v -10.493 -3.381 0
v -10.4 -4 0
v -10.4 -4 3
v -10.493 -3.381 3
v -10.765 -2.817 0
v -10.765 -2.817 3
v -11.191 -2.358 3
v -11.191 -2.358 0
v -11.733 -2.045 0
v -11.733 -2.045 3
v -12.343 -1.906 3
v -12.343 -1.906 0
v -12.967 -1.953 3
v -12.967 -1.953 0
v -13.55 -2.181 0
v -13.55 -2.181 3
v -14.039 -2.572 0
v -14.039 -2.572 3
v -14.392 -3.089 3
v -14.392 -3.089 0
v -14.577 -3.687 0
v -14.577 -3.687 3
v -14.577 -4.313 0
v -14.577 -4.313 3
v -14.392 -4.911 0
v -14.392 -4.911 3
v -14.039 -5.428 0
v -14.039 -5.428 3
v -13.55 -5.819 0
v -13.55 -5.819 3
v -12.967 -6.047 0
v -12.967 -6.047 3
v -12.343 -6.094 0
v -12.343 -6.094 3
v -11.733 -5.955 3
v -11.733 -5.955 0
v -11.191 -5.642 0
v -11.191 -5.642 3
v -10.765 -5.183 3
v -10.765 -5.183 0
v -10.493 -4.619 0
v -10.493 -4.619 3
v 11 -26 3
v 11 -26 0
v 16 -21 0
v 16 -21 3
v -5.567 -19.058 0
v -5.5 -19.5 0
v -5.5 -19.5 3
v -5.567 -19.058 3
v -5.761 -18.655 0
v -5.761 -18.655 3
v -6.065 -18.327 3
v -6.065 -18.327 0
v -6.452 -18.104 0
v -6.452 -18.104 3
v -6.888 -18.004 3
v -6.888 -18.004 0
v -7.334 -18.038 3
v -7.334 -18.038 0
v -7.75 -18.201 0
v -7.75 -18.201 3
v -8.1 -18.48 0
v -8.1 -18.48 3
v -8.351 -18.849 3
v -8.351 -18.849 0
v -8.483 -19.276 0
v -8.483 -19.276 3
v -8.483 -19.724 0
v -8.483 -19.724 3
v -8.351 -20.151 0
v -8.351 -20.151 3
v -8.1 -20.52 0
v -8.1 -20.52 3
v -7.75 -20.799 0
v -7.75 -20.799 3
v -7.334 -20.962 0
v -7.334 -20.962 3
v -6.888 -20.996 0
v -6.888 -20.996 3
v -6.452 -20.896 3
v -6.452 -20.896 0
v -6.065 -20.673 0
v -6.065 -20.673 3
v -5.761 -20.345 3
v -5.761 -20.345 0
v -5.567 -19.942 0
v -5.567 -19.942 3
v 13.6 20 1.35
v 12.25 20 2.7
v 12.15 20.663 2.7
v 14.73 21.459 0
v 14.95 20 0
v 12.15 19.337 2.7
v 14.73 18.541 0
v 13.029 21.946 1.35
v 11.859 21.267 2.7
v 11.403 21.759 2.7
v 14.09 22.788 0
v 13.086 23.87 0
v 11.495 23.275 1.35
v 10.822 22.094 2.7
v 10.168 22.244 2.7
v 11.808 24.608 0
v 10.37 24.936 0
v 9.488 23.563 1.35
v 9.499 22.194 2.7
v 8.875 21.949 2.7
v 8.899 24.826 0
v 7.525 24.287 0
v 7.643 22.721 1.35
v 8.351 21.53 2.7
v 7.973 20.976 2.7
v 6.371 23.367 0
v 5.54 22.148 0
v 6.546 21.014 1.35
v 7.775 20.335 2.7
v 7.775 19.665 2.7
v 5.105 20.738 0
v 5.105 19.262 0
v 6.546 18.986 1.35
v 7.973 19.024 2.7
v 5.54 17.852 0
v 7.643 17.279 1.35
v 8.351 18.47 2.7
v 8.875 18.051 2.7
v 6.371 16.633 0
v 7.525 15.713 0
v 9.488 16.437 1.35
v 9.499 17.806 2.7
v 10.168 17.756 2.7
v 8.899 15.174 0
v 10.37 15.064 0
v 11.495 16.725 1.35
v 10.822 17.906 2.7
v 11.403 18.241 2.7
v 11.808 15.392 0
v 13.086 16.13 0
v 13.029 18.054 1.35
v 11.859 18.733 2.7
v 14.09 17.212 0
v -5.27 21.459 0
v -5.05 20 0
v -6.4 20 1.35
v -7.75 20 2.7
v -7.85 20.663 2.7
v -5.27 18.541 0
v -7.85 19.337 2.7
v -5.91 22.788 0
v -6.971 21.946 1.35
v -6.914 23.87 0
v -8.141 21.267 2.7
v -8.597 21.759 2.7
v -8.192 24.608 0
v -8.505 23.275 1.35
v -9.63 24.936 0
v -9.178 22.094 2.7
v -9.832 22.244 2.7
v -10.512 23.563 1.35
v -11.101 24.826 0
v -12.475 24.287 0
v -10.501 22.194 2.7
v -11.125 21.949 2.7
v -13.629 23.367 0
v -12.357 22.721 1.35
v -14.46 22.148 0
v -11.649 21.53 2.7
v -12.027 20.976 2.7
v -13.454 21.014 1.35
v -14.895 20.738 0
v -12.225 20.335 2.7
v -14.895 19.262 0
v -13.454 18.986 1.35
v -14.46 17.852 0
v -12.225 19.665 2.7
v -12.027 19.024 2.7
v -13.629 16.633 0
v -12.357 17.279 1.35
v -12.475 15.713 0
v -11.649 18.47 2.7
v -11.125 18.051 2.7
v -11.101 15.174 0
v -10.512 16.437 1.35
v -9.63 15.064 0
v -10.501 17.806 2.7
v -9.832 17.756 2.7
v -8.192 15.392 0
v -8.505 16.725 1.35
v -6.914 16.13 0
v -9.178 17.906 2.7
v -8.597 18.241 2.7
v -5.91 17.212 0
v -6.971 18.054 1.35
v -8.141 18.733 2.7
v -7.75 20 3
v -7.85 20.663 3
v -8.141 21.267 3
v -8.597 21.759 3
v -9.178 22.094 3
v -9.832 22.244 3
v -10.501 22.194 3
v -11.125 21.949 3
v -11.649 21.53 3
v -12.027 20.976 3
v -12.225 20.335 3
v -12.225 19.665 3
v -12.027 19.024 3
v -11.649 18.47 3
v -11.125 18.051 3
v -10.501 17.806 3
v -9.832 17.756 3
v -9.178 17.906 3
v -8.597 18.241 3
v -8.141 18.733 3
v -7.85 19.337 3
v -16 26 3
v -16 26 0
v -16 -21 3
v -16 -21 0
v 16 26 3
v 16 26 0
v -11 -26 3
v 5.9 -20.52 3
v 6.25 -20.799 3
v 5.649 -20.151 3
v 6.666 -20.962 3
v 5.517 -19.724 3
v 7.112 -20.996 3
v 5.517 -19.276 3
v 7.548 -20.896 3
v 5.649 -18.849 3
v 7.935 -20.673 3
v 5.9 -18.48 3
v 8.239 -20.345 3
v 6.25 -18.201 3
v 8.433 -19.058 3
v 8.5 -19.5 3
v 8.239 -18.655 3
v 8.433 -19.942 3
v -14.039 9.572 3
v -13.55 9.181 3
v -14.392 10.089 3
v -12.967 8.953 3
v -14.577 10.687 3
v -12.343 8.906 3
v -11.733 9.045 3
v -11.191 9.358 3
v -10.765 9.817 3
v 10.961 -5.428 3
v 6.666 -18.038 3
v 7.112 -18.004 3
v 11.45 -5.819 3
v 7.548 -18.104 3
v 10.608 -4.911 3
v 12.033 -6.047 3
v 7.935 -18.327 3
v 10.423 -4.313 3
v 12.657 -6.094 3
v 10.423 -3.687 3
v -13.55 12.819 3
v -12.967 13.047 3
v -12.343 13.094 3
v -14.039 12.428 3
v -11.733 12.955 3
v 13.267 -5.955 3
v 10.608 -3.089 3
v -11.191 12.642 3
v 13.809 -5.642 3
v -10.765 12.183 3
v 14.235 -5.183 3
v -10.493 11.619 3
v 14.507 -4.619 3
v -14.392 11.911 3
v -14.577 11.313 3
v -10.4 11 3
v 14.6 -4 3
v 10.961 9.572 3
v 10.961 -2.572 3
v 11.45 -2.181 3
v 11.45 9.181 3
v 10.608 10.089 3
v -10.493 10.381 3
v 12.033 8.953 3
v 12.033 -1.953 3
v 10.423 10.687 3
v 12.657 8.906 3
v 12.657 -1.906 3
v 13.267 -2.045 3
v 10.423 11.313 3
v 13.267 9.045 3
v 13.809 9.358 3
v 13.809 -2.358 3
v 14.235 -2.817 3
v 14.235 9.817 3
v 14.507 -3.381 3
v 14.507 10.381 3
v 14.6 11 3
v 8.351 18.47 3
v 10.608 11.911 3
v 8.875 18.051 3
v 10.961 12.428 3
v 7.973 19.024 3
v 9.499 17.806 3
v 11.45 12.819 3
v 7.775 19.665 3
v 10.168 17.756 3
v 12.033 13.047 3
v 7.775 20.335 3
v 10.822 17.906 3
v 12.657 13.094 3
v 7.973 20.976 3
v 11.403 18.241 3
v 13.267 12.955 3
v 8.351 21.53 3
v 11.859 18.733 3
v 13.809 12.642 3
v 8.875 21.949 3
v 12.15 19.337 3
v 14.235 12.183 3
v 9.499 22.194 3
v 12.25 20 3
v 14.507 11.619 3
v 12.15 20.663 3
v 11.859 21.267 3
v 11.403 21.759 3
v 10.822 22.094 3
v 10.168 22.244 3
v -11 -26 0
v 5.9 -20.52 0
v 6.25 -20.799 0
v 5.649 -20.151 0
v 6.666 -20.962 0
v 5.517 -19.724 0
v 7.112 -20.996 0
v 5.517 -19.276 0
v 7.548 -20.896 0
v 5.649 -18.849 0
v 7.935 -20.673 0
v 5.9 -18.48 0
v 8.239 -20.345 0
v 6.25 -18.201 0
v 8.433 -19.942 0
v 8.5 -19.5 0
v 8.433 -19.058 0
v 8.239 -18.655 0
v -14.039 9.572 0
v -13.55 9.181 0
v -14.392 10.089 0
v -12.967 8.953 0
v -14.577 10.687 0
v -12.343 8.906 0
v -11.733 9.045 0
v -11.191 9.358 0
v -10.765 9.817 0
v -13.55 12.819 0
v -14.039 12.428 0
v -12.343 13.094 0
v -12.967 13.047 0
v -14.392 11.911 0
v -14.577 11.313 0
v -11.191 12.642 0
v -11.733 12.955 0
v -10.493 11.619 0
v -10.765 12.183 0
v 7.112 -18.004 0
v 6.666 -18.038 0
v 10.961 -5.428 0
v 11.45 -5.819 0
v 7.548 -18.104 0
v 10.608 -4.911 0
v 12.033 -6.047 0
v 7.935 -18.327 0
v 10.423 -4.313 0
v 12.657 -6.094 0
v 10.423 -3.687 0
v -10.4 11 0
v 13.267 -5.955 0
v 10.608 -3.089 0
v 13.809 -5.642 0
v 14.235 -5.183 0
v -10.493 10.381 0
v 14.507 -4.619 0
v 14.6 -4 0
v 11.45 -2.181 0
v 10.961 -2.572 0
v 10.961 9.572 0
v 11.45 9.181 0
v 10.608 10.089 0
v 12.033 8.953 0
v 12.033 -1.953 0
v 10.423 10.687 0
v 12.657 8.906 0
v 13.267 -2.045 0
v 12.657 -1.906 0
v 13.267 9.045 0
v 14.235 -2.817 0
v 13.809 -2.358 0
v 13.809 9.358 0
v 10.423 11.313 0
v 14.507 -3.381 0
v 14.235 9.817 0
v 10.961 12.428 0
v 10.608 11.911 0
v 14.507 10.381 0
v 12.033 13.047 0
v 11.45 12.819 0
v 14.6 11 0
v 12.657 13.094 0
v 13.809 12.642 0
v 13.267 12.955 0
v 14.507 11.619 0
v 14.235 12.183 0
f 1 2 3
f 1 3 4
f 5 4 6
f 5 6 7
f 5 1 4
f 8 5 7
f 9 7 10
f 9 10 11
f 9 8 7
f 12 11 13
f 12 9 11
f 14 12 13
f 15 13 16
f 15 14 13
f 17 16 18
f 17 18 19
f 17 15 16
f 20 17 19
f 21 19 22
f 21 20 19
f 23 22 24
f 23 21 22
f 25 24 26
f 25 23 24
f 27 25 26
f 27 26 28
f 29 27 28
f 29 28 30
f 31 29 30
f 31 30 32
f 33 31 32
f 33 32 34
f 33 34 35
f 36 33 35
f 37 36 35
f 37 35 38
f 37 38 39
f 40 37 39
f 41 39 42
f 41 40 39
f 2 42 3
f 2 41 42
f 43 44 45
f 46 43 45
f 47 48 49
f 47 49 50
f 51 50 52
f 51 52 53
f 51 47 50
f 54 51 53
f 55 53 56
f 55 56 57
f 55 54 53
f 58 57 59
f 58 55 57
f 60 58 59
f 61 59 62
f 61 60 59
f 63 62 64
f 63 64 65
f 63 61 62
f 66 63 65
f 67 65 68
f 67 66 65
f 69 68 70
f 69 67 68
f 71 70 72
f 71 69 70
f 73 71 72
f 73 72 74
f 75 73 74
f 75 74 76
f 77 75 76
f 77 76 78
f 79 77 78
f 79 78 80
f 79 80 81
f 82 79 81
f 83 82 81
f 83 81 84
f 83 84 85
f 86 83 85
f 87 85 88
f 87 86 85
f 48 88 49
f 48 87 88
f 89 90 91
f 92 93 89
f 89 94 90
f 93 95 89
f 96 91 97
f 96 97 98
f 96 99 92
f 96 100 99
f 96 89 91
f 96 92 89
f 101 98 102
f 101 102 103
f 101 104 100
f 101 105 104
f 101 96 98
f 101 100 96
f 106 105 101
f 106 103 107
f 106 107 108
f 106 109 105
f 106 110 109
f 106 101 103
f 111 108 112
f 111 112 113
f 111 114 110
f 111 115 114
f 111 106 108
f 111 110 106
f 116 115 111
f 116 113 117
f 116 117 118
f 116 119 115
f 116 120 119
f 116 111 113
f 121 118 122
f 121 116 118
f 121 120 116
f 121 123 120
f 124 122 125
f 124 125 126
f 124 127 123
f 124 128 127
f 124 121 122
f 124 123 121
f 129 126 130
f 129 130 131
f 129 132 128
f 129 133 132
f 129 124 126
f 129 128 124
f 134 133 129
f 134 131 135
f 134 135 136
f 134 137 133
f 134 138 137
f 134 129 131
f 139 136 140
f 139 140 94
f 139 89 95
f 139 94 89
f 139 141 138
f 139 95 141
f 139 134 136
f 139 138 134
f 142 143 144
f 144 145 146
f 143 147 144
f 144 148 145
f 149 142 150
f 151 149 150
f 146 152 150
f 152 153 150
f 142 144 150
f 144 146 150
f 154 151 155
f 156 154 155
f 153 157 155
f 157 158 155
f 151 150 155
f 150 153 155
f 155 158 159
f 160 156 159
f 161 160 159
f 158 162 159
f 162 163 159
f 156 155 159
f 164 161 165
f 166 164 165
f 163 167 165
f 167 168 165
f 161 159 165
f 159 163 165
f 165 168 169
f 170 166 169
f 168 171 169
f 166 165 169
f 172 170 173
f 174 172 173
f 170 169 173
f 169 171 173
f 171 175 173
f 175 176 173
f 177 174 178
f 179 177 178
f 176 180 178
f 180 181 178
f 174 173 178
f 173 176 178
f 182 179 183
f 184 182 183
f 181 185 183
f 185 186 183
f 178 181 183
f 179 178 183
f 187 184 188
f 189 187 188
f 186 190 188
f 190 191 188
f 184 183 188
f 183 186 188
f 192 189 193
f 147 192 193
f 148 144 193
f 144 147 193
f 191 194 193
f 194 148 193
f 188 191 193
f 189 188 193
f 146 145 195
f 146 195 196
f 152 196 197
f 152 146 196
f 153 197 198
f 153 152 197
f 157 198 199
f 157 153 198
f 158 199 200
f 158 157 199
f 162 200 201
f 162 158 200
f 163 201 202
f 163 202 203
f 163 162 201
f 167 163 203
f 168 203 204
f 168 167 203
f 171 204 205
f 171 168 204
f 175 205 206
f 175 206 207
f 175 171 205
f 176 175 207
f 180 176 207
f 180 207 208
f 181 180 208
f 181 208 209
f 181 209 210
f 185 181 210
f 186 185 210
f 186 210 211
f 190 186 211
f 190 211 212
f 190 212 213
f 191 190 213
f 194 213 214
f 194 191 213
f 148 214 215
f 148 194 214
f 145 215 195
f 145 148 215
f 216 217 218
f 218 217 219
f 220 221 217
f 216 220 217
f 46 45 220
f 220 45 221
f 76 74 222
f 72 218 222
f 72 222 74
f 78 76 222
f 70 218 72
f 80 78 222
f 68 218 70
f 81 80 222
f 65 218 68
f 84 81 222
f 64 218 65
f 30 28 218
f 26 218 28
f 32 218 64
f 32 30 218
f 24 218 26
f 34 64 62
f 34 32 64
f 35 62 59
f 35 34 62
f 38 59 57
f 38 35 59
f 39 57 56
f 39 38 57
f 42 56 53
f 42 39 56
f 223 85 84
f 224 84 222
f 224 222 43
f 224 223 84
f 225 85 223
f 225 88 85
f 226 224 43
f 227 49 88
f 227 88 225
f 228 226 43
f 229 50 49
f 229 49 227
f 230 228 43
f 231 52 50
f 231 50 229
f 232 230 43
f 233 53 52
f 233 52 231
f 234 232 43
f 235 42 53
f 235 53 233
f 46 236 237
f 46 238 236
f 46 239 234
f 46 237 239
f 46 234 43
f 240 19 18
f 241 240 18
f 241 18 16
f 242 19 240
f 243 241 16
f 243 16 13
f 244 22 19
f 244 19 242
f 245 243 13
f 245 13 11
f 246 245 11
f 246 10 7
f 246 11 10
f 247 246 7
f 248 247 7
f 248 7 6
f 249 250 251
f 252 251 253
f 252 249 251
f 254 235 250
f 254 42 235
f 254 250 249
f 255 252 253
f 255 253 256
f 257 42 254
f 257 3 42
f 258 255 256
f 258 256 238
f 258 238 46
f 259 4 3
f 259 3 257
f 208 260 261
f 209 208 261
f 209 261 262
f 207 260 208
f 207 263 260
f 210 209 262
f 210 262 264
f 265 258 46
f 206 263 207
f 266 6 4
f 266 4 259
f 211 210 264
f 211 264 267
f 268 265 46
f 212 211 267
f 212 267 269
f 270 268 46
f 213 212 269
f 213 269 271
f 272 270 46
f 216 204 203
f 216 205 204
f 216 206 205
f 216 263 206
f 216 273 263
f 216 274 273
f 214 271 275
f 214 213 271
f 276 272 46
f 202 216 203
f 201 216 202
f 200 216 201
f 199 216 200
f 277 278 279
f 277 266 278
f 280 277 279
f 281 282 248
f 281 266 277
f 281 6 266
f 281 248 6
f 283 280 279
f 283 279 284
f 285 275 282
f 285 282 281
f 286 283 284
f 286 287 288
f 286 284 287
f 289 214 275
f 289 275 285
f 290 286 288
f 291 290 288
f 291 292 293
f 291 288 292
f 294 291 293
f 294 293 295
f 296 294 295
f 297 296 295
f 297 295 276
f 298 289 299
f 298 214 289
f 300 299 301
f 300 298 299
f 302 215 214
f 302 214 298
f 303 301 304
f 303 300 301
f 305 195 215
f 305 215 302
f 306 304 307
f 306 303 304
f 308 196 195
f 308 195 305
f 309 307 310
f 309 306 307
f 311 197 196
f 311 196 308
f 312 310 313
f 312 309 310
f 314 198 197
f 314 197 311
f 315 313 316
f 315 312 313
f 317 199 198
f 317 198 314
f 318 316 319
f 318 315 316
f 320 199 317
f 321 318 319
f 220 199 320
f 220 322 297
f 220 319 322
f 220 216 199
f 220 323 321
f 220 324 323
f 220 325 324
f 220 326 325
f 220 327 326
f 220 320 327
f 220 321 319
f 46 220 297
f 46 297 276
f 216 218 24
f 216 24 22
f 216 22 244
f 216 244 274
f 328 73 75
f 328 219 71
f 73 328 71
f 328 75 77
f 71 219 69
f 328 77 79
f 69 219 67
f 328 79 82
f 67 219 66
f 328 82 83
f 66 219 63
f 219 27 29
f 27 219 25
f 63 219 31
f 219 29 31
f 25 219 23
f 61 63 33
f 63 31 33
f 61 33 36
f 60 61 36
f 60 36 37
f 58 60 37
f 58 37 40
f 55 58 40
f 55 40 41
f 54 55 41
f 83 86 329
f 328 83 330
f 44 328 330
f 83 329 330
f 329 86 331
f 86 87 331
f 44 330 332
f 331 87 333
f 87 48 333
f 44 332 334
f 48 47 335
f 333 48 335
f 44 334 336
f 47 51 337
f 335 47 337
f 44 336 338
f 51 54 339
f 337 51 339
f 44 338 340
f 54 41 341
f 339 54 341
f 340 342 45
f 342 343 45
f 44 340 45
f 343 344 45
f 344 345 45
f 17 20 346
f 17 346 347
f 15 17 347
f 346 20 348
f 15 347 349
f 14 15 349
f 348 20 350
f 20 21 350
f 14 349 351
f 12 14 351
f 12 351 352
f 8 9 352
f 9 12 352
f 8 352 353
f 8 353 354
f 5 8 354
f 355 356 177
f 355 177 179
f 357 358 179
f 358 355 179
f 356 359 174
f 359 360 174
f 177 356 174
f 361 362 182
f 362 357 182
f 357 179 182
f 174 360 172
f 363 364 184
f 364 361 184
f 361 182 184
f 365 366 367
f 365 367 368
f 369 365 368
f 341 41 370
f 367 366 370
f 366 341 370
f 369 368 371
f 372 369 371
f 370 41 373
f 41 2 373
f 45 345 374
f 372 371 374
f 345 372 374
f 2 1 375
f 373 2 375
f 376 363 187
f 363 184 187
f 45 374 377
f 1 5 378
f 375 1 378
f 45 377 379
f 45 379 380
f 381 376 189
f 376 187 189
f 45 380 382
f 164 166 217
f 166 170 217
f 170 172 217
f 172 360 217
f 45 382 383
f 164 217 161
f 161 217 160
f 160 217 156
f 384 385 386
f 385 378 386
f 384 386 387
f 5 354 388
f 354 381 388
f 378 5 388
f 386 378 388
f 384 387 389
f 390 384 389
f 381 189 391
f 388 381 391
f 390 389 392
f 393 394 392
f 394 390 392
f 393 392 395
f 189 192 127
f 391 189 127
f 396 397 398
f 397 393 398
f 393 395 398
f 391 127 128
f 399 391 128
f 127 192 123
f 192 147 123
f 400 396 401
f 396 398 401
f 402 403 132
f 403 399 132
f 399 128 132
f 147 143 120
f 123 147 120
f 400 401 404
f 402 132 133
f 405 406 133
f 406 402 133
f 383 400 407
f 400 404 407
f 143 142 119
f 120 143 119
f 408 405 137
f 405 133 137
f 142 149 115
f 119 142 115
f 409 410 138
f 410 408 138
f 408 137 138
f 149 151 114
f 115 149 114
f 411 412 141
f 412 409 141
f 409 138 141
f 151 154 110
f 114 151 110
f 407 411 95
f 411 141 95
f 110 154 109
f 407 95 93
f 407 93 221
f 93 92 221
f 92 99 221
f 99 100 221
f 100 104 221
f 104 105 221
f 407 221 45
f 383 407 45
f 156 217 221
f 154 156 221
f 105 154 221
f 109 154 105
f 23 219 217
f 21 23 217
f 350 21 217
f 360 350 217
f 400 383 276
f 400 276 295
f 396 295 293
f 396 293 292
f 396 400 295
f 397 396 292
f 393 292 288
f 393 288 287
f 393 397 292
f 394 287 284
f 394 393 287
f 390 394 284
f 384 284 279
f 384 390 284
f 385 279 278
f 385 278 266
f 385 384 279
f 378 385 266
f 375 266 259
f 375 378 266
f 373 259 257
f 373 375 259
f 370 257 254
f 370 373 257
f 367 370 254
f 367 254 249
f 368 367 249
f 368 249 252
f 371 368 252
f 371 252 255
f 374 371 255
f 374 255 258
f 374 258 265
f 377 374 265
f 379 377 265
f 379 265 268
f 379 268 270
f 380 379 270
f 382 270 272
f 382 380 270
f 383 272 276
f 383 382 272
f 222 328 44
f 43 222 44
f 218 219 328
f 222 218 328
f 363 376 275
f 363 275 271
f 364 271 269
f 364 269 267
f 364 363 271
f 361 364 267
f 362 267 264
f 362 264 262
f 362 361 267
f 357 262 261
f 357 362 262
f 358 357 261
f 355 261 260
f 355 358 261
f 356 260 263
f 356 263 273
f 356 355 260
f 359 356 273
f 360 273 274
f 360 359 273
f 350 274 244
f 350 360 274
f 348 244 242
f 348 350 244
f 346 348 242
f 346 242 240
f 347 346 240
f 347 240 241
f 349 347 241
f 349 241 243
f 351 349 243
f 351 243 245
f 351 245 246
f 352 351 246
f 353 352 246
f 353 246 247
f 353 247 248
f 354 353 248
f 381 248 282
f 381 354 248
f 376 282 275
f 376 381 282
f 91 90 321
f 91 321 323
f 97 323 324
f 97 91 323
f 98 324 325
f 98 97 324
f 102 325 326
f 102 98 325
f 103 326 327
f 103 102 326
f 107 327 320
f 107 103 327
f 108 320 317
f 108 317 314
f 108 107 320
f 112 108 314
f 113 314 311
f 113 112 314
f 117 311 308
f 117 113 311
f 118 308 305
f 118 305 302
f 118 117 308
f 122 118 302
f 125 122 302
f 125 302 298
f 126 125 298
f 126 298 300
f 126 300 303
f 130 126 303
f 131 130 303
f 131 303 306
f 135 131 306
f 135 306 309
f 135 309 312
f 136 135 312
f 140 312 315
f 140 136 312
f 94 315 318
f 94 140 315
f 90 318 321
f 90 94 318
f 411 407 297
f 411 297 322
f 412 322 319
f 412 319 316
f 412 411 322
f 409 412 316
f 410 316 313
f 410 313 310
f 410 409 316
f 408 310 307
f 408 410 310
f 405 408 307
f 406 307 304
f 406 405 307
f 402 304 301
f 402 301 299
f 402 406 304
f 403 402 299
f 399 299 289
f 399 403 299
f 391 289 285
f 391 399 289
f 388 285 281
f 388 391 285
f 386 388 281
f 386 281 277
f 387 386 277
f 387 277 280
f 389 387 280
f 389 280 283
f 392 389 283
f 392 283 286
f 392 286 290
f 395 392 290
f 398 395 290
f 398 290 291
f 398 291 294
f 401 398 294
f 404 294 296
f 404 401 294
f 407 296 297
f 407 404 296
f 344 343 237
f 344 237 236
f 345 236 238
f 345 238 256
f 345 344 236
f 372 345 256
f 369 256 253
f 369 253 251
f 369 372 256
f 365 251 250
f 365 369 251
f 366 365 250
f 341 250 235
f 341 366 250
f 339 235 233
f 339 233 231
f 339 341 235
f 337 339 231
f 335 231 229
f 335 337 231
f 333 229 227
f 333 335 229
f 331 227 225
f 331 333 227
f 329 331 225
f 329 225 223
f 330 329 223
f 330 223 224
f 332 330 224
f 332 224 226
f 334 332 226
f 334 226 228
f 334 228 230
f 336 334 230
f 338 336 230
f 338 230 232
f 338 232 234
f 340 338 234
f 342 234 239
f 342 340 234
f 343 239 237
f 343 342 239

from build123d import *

# Parameters (mm, degrees)
SKETCH_1_R      = 2.1
SKETCH_1_R_2    = 1.5
SKETCH_1_R_3    = 2.25
EXTRUDE_1_DEPTH = 3
CHAMFER_2_SIZE  = 2.7
CHAMFER_3_SIZE  = 2.7


with BuildPart() as part:
    # 草图1 → 拉伸1 (new body)
    with BuildSketch(Plane.XY):
        Polygon((-16, -21), (-11, -26), (11, -26), (16, -21), (16, 26), (-16, 26), align=None)
        with Locations((-12.5, 11)):
            Circle(SKETCH_1_R, mode=Mode.SUBTRACT)
        with Locations((12.5, 11)):
            Circle(SKETCH_1_R, mode=Mode.SUBTRACT)
        with Locations((12.5, -4)):
            Circle(SKETCH_1_R, mode=Mode.SUBTRACT)
        with Locations((-12.5, -4)):
            Circle(SKETCH_1_R, mode=Mode.SUBTRACT)
        with Locations((-7, -19.5)):
            Circle(SKETCH_1_R_2, mode=Mode.SUBTRACT)
        with Locations((7, -19.5)):
            Circle(SKETCH_1_R_2, mode=Mode.SUBTRACT)
        with Locations((10, 20)):
            Circle(SKETCH_1_R_3, mode=Mode.SUBTRACT)
        with Locations((-10, 20)):
            Circle(SKETCH_1_R_3, mode=Mode.SUBTRACT)
    extrude(amount=EXTRUDE_1_DEPTH)

    # 倒角2
    chamfer_2_edges = [part.edges().sort_by_distance(p)[0] for p in [
        (7.75, 20, 0),
    ]]
    chamfer(chamfer_2_edges, length=CHAMFER_2_SIZE)

    # 倒角3
    chamfer_3_edges = [part.edges().sort_by_distance(p)[0] for p in [
        (-12.25, 20, 0),
    ]]
    chamfer(chamfer_3_edges, length=CHAMFER_3_SIZE)


solid = part.part
